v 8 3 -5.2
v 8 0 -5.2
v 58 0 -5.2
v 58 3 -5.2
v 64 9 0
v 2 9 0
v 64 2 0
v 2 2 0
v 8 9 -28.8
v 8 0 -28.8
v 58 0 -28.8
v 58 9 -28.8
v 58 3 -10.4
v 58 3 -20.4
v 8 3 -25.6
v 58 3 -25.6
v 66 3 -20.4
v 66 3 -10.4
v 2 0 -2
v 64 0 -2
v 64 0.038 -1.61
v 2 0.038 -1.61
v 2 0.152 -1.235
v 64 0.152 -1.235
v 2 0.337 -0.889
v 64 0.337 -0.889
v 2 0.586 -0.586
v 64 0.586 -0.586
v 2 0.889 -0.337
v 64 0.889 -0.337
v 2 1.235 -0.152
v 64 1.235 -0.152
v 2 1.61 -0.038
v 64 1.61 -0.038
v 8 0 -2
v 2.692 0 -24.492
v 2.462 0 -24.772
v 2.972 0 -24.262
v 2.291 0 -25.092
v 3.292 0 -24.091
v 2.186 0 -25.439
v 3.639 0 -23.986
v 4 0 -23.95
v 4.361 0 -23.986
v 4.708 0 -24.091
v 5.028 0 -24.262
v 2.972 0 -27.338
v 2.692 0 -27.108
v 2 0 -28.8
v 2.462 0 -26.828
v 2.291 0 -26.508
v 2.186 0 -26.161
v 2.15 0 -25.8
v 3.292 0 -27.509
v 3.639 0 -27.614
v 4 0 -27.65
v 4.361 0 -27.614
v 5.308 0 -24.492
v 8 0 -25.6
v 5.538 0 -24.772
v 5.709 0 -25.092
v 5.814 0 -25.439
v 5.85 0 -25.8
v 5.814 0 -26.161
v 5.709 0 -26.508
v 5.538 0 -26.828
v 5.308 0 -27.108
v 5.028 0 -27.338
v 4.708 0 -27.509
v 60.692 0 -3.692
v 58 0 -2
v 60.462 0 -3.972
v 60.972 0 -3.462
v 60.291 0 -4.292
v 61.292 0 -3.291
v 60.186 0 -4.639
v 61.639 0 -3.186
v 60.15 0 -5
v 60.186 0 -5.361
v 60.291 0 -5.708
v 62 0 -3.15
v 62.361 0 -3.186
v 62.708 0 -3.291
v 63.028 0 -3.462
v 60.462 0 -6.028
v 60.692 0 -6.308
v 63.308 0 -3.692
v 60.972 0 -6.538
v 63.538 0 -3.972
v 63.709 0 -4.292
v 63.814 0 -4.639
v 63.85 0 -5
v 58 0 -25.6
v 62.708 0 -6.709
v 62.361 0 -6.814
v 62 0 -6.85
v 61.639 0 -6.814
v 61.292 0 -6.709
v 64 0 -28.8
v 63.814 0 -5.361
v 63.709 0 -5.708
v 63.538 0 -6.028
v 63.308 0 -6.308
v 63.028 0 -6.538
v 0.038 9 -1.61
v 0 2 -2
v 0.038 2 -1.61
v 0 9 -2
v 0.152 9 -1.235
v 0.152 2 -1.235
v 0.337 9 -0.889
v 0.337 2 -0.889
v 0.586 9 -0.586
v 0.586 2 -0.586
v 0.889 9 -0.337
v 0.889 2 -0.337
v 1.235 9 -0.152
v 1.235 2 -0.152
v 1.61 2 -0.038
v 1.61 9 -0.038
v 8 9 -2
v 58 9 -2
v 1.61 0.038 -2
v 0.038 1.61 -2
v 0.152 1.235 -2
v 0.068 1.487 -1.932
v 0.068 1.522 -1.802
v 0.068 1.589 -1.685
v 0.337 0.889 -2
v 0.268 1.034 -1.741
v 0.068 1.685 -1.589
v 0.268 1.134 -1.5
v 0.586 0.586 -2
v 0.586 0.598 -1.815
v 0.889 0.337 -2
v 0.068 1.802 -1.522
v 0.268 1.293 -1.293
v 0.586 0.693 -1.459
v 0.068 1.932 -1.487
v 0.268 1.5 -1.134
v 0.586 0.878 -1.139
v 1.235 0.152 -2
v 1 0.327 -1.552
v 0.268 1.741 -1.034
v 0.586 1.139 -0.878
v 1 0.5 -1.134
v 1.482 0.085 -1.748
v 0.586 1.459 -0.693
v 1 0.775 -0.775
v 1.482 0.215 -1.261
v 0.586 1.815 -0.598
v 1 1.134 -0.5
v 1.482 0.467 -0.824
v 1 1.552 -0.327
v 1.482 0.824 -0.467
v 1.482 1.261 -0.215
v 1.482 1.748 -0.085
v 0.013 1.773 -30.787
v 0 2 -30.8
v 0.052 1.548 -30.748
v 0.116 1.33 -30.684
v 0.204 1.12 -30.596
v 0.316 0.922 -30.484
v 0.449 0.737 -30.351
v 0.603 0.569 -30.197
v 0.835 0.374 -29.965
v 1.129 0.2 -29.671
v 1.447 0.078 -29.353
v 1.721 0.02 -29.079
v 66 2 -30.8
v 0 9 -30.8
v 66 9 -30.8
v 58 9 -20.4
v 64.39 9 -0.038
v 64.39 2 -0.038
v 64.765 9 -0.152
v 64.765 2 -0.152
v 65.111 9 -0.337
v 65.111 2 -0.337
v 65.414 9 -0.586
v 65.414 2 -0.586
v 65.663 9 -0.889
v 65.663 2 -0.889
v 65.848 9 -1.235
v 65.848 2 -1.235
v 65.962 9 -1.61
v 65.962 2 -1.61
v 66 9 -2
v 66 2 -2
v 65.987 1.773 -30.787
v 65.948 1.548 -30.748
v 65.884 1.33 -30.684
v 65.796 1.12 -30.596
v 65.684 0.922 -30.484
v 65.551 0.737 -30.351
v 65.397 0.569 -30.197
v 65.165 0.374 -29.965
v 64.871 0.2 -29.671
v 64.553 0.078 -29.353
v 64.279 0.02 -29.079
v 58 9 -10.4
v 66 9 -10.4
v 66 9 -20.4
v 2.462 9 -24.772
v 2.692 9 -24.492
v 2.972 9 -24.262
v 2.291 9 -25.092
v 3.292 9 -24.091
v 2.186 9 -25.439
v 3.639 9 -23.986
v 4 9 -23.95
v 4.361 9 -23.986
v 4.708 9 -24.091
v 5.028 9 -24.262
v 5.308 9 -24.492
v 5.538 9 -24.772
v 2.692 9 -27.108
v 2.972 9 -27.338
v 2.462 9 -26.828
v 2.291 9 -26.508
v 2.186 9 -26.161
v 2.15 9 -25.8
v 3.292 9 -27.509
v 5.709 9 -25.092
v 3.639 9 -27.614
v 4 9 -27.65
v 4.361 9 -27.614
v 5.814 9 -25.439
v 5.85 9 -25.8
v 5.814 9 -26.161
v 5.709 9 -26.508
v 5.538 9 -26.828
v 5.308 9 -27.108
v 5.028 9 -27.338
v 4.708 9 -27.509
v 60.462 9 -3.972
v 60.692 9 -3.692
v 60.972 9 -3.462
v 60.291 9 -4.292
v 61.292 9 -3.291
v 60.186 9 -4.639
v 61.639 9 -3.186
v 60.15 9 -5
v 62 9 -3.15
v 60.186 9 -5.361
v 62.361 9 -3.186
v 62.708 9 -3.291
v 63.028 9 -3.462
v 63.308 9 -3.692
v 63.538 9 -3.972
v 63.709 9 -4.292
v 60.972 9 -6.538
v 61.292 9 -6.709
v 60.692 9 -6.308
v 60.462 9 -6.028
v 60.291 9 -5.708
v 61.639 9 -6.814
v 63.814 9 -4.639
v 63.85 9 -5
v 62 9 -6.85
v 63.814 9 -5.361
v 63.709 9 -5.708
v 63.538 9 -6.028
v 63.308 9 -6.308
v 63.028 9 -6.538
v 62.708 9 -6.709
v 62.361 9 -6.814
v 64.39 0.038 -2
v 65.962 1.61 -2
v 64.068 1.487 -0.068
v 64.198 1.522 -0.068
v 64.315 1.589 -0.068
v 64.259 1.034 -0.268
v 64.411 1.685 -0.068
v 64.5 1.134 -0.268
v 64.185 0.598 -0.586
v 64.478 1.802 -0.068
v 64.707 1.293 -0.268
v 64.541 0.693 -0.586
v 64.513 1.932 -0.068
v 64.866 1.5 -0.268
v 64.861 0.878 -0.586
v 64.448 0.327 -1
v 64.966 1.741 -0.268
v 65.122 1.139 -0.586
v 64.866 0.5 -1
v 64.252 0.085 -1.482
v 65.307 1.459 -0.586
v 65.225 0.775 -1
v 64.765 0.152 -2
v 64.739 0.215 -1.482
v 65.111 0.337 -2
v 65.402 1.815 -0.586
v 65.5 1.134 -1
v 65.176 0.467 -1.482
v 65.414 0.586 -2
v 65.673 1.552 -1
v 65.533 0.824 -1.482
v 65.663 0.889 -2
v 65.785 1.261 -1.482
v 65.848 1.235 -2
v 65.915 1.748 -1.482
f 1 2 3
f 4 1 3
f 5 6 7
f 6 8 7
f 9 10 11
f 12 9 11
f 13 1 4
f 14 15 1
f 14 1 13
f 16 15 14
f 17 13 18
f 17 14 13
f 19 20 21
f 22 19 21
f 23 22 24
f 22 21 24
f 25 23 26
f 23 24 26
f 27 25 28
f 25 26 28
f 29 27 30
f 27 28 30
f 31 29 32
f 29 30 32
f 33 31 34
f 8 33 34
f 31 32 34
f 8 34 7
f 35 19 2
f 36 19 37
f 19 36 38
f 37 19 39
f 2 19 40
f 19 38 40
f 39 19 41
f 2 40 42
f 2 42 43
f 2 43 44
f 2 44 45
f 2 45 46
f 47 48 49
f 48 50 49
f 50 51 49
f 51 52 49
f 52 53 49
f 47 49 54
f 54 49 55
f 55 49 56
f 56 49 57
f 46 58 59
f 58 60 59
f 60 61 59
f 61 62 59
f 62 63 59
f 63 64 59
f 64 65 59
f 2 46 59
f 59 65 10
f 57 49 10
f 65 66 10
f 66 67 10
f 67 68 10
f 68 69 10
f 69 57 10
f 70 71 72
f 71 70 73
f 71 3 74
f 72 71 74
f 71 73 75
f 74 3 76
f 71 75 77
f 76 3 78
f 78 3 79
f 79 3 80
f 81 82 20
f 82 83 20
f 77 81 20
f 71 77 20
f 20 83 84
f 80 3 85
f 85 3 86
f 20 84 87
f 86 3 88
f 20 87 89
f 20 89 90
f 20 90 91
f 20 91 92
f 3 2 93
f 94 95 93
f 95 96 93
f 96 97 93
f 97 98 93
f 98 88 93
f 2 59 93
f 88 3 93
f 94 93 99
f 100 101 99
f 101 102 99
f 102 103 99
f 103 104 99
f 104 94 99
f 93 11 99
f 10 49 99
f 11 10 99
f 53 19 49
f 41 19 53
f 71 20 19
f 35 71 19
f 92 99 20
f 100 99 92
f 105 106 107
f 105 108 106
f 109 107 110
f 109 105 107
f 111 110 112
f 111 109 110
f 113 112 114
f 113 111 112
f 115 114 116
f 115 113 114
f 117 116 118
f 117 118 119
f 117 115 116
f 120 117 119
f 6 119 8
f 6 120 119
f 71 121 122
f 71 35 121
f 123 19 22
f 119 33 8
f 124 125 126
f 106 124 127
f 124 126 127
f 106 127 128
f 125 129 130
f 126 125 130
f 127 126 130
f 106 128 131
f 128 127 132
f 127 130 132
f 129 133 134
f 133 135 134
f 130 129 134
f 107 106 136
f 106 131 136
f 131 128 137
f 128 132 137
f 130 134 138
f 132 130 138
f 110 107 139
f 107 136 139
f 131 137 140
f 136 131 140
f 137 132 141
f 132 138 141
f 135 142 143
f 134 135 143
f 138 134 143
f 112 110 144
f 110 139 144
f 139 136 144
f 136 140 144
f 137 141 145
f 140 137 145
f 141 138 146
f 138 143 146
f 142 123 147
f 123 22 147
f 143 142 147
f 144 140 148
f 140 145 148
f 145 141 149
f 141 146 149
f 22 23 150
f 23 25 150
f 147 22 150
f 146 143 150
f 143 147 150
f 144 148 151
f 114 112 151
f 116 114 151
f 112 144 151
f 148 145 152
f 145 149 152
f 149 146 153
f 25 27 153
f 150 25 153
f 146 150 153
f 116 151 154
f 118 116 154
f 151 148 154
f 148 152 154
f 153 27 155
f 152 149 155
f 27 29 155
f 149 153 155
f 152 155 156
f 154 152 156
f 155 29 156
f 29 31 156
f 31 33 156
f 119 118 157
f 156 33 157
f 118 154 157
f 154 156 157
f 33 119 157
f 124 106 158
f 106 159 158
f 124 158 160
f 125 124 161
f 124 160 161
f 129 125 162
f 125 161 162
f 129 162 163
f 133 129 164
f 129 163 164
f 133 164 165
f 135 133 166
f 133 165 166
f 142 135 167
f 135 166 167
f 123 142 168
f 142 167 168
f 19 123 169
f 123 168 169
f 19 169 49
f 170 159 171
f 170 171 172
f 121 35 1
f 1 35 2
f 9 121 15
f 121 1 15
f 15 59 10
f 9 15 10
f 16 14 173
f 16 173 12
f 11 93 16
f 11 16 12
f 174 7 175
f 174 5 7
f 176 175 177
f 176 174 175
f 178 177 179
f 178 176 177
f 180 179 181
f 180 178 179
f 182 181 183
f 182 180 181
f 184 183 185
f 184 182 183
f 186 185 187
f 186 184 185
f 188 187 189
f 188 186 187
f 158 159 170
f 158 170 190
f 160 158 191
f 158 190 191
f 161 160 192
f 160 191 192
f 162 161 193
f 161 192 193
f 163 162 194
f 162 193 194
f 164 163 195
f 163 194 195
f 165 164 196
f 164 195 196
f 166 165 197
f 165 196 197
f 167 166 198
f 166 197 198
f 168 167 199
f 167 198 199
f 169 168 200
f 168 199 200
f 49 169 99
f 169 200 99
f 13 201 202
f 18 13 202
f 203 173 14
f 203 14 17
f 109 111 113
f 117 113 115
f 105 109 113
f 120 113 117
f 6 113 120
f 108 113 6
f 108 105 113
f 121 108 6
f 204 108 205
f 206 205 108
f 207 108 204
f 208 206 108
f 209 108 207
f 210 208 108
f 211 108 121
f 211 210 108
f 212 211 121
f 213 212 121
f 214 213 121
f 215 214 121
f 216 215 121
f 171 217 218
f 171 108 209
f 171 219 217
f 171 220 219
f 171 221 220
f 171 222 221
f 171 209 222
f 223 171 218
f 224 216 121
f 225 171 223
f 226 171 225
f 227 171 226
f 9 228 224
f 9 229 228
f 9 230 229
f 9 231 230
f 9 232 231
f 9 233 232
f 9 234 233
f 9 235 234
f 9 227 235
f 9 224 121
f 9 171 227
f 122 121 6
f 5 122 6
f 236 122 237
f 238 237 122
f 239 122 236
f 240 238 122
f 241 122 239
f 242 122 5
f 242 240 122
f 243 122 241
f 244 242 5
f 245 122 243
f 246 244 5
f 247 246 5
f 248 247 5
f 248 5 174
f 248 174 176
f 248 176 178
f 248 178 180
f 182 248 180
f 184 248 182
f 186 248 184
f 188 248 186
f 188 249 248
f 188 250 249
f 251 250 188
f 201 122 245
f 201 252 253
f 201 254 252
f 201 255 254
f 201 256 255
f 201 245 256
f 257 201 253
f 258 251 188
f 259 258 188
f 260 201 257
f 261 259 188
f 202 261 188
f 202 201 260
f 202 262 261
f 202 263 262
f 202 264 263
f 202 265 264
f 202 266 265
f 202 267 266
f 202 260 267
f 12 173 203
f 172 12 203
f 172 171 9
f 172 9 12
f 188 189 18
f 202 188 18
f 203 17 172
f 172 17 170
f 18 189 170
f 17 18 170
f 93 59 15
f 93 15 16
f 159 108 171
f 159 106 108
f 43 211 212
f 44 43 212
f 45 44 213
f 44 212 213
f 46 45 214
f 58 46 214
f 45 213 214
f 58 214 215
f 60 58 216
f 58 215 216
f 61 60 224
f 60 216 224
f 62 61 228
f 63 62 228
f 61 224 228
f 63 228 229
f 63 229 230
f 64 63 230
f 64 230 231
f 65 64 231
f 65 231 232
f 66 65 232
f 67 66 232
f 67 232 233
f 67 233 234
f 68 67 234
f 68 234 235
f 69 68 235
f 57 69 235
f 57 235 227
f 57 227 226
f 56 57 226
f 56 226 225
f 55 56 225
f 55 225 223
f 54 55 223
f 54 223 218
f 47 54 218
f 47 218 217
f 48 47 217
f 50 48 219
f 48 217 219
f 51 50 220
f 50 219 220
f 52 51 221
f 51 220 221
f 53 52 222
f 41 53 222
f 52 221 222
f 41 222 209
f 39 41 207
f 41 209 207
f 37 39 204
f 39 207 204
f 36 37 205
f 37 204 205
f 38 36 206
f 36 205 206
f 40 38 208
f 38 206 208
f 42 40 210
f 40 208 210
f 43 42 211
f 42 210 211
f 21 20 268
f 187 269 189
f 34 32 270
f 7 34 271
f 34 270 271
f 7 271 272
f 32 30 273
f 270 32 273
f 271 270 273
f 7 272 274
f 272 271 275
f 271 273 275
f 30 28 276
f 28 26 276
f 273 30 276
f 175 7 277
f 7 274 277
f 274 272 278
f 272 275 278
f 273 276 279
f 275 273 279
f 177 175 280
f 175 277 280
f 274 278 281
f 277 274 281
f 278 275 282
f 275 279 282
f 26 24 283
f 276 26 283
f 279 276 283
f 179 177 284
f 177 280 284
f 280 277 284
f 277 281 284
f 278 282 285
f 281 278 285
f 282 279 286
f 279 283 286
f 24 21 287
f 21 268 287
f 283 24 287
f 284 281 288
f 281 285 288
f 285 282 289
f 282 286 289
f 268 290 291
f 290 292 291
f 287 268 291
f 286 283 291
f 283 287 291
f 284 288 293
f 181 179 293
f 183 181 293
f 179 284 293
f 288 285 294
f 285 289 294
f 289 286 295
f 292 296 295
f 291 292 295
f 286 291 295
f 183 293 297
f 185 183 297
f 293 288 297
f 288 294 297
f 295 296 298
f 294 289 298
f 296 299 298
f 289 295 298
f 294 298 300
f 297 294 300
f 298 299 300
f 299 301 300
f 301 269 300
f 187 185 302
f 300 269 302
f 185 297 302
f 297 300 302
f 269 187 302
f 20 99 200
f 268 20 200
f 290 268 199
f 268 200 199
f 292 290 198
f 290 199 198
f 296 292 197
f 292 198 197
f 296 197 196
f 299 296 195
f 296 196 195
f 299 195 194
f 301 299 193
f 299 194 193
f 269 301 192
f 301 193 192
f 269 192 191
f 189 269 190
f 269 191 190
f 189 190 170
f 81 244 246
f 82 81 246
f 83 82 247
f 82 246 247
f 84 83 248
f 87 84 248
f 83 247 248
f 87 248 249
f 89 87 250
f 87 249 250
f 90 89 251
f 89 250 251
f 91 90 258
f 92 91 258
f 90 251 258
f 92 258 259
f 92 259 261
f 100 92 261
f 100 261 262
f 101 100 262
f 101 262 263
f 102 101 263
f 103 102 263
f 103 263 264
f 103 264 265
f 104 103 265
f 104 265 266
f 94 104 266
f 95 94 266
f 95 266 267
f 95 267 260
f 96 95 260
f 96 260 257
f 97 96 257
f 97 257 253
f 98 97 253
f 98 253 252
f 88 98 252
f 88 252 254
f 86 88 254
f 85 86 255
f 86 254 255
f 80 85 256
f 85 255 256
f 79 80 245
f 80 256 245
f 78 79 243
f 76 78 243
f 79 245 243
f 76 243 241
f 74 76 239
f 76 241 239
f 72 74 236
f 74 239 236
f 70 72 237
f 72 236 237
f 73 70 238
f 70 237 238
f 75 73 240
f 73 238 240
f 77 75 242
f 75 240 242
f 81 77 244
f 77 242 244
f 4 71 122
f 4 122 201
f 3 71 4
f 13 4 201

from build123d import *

# Parameters (mm, degrees)
SKETCH1_W           = 66
SKETCH1_H           = 30.8
SKETCH1_W_2         = 50
SKETCH1_H_2         = 3.2
BOSS_EXTRUDE1_DEPTH = 3
SKETCH2_W           = 66
SKETCH2_H           = 30.8
SKETCH2_W_2         = 50
SKETCH2_H_2         = 26.8
BOSS_EXTRUDE2_DEPTH = 6
SKETCH3_R           = 1.85
CUT_EXTRUDE1_DEPTH  = 74.386919815
FILLET1_R           = 2
SKETCH4_W           = 8
SKETCH4_H           = 10
CUT_EXTRUDE2_DEPTH  = 6


with BuildPart() as part:
    # Sketch1 → Boss-Extrude1 (new body)
    with BuildSketch(Plane(origin=(0, 0, 0), x_dir=(1, 0, 0), z_dir=(0, 1, 0))):
        with Locations((33, 15.4)):
            Rectangle(SKETCH1_W, SKETCH1_H)
        with Locations((33, 27.2)):
            Rectangle(SKETCH1_W_2, SKETCH1_H_2, mode=Mode.SUBTRACT)
        with Locations((33, 3.6)):
            Rectangle(SKETCH1_W_2, SKETCH1_H_2, mode=Mode.SUBTRACT)
    extrude(amount=BOSS_EXTRUDE1_DEPTH)

    # Sketch2 → Boss-Extrude2 (add)
    with BuildSketch(Plane(origin=(0, 3, 0), x_dir=(1, 0, 0), z_dir=(0, 1, 0))):
        with Locations((33, 15.4)):
            Rectangle(SKETCH2_W, SKETCH2_H)
        with Locations((33, 15.4)):
            Rectangle(SKETCH2_W_2, SKETCH2_H_2, mode=Mode.SUBTRACT)
    extrude(amount=BOSS_EXTRUDE2_DEPTH)

    # Sketch3 → Cut-Extrude1 (cut, through all)
    with BuildSketch(Plane(origin=(0, 9, 0), x_dir=(1, 0, 0), z_dir=(0, 1, 0))):
        with Locations(Location((62, 5, 0), (0, 0, 270))):
            Circle(SKETCH3_R)
        with Locations(Location((4, 25.8, 0), (0, 0, 270))):
            Circle(SKETCH3_R)
    extrude(amount=-CUT_EXTRUDE1_DEPTH, mode=Mode.SUBTRACT)

    # Fillet1
    fillet1_edges = [part.edges().sort_by_distance(p)[0] for p in [
        (33, 0, -30.8),
        (66, 0, -15.4),
        (33, 0, 0),
        (0, 0, -15.4),
        (66, 4.5, 0),
        (0, 4.5, 0),
    ]]
    fillet(fillet1_edges, radius=FILLET1_R - 0.0001)  # a hair under: the kernel refuses the full size

    # Sketch4 → Cut-Extrude2 (cut)
    with BuildSketch(Plane(origin=(0, 9, 0), x_dir=(1, 0, 0), z_dir=(0, 1, 0))):
        with Locations((62, 15.4)):
            Rectangle(SKETCH4_W, SKETCH4_H)
    extrude(amount=-CUT_EXTRUDE2_DEPTH, mode=Mode.SUBTRACT)


solid = part.part
